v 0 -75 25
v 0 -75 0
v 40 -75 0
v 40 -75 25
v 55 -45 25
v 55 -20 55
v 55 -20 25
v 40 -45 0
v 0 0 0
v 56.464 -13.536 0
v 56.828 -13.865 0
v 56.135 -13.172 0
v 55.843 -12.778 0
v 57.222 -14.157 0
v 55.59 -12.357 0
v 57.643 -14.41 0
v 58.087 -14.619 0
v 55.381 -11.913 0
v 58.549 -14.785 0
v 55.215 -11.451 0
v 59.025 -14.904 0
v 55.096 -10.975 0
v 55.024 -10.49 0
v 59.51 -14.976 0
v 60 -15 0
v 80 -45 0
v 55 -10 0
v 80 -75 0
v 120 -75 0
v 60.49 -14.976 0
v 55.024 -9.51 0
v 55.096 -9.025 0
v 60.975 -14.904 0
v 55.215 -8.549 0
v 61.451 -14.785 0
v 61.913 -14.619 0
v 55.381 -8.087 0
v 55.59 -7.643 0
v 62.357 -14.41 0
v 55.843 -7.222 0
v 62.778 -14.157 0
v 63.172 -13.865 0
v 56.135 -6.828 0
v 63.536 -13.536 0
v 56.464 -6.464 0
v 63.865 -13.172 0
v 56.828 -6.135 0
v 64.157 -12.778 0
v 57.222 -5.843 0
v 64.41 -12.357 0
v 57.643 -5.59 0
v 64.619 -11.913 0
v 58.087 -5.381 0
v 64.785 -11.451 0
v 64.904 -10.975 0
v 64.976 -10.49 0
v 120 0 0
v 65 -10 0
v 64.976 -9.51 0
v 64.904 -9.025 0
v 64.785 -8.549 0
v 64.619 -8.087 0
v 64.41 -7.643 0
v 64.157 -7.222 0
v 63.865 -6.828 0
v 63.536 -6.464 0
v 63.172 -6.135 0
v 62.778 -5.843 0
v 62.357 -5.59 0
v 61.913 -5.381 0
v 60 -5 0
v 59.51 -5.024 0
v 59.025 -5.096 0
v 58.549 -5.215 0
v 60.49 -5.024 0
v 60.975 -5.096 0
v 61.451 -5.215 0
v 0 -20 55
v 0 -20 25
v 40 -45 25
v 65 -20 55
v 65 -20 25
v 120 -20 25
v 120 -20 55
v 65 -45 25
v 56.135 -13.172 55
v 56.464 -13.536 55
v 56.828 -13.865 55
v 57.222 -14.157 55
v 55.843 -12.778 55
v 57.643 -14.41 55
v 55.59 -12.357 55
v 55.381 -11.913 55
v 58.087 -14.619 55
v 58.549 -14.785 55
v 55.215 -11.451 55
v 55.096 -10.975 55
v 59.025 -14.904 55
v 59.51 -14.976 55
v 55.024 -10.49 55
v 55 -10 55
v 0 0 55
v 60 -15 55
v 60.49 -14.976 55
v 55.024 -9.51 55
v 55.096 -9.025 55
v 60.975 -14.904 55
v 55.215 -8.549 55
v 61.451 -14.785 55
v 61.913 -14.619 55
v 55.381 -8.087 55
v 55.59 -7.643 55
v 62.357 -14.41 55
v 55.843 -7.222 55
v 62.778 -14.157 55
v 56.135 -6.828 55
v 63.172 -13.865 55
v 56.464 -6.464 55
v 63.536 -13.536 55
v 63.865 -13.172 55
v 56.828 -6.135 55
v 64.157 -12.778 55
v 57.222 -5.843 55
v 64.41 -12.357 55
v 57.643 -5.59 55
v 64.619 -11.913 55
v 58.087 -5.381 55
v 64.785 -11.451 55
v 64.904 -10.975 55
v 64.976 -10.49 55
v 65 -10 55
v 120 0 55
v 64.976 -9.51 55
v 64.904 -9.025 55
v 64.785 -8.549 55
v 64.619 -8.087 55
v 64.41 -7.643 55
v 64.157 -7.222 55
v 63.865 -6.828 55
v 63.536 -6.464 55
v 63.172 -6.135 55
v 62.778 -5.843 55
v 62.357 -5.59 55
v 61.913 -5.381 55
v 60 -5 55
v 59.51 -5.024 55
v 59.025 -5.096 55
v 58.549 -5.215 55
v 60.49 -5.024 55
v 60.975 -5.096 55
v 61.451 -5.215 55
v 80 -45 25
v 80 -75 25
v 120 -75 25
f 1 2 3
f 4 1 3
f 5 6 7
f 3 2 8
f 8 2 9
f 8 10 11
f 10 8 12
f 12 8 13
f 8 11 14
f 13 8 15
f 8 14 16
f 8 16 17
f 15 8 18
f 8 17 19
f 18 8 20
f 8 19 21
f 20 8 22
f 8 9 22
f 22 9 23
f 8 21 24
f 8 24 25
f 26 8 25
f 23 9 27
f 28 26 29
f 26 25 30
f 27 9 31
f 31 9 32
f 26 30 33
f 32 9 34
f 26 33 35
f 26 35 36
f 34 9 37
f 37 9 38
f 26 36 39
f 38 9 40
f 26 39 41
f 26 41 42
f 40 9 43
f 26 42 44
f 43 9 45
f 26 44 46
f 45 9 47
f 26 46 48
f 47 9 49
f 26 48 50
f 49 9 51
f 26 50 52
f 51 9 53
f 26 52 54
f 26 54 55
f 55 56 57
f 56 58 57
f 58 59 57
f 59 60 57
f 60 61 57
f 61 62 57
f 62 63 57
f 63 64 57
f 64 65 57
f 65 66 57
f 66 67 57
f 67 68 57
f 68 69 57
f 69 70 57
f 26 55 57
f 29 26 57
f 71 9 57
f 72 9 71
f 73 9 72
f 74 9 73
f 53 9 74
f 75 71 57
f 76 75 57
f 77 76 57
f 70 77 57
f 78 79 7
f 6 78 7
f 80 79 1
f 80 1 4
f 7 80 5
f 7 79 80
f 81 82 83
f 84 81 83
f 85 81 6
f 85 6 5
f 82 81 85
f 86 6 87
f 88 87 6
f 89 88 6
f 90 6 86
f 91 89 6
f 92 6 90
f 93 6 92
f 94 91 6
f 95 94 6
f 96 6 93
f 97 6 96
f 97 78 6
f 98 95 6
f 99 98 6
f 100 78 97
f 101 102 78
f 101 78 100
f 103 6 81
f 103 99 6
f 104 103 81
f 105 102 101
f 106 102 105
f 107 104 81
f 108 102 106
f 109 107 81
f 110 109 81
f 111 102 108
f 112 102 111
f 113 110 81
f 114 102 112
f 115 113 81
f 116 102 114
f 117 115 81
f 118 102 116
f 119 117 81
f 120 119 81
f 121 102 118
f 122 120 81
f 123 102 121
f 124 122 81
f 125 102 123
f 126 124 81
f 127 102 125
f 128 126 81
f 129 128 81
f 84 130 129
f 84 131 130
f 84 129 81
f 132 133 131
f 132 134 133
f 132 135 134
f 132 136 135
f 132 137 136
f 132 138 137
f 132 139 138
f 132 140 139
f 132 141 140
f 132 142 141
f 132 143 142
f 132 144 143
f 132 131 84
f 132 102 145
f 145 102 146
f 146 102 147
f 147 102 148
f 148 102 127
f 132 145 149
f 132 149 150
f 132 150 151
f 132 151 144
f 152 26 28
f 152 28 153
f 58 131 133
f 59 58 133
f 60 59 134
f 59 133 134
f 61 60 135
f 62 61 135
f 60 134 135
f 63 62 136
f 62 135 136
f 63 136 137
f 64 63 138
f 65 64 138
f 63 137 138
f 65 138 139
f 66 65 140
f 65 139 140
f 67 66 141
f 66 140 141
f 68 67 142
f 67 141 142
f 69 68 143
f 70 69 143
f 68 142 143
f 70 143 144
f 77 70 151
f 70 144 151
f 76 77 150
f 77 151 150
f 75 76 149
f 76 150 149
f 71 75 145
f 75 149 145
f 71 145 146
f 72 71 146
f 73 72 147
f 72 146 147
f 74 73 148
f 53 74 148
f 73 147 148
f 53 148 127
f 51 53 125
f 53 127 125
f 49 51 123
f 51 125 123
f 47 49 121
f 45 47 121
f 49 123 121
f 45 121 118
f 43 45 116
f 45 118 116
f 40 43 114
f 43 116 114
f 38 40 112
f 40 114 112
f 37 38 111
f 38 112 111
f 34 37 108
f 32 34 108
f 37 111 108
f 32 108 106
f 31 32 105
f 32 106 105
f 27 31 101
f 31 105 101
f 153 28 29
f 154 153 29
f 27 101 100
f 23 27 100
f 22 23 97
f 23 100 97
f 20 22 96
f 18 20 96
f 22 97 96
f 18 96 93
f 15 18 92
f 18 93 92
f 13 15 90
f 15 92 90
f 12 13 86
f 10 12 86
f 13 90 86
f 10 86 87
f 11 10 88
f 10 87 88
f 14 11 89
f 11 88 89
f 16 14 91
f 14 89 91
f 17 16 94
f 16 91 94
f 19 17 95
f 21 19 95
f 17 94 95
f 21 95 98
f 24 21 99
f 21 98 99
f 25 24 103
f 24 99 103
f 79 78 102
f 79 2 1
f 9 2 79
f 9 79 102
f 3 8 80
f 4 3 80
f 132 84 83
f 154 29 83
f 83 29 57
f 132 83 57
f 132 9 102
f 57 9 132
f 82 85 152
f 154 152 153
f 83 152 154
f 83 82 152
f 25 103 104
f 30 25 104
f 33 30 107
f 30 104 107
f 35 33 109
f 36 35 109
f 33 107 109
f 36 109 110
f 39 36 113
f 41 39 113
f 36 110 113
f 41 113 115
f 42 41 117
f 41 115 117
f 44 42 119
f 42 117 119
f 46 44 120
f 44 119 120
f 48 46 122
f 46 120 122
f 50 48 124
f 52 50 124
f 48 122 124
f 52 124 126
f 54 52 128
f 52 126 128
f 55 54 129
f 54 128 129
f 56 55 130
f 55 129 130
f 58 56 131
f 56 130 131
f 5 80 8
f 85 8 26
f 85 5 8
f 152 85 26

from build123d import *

# Parameters (mm, degrees)
SKETCH_1_W          = 120
SKETCH_1_H          = 75
EXTRUDE_1_DEPTH     = 25
SKETCH_2_W          = 40
SKETCH_2_H          = 25
CUT_EXTRUDE_1_DEPTH = 30
SKETCH_3_W          = 120
SKETCH_3_H          = 20
EXTRUDE_2_DEPTH     = 30
EXTRUDE_START       = -55
EXTRUDE_3_DEPTH     = 10
CUT_EXTRUDE_2_DEPTH = 152.822264507


with BuildPart() as part:
    # Эскиз1 → Бобышка-Вытянуть1 (new body)
    with BuildSketch(Plane.XY):
        with Locations((60, -37.5)):
            Rectangle(SKETCH_1_W, SKETCH_1_H)
    extrude(amount=EXTRUDE_1_DEPTH)

    # Эскиз2 → Вырез-Вытянуть1 (cut)
    with BuildSketch(Plane.XZ.offset(75)):
        with Locations((60, 12.5)):
            Rectangle(SKETCH_2_W, SKETCH_2_H)
    extrude(amount=-CUT_EXTRUDE_1_DEPTH, mode=Mode.SUBTRACT)

    # Эскиз3 → Бобышка-Вытянуть2 (add)
    with BuildSketch(Plane.XY.offset(25)):
        with Locations((60, -10)):
            Rectangle(SKETCH_3_W, SKETCH_3_H)
    extrude(amount=EXTRUDE_2_DEPTH)

    # Эскиз5 → Бобышка-Вытянуть3 (add)
    with BuildSketch(Plane(origin=(120, 0, 0), x_dir=(0, 0, -1), z_dir=(1, 0, 0)).offset(EXTRUDE_START)):
        Polygon((-55, -20), (-25, -45), (-25, -20), align=None)
    extrude(amount=-EXTRUDE_3_DEPTH)

    # Эскиз6 → Вырез-Вытянуть2 (cut, through all)
    with BuildSketch(Plane.XY.offset(55)):
        with BuildLine():
            ThreePointArc((55, -10), (56.464466094, -13.535533906), (60, -15))
            Line((60, -15), (60, -10))
            Line((60, -10), (55, -10))
        make_face()
        with BuildLine():
            Line((60, -10), (60, -15))
            ThreePointArc((60, -15), (63.535533906, -13.535533906), (65, -10))
            Line((65, -10), (60, -10))
        make_face()
        with BuildLine():
            Line((55, -10), (60, -10))
            Line((60, -10), (60, -5))
            ThreePointArc((60, -5), (56.464466094, -6.464466094), (55, -10))
        make_face()
        with BuildLine():
            Line((60, -5), (60, -10))
            Line((60, -10), (65, -10))
            ThreePointArc((65, -10), (63.535533906, -6.464466094), (60, -5))
        make_face()
    extrude(amount=-CUT_EXTRUDE_2_DEPTH, mode=Mode.SUBTRACT)


solid = part.part
